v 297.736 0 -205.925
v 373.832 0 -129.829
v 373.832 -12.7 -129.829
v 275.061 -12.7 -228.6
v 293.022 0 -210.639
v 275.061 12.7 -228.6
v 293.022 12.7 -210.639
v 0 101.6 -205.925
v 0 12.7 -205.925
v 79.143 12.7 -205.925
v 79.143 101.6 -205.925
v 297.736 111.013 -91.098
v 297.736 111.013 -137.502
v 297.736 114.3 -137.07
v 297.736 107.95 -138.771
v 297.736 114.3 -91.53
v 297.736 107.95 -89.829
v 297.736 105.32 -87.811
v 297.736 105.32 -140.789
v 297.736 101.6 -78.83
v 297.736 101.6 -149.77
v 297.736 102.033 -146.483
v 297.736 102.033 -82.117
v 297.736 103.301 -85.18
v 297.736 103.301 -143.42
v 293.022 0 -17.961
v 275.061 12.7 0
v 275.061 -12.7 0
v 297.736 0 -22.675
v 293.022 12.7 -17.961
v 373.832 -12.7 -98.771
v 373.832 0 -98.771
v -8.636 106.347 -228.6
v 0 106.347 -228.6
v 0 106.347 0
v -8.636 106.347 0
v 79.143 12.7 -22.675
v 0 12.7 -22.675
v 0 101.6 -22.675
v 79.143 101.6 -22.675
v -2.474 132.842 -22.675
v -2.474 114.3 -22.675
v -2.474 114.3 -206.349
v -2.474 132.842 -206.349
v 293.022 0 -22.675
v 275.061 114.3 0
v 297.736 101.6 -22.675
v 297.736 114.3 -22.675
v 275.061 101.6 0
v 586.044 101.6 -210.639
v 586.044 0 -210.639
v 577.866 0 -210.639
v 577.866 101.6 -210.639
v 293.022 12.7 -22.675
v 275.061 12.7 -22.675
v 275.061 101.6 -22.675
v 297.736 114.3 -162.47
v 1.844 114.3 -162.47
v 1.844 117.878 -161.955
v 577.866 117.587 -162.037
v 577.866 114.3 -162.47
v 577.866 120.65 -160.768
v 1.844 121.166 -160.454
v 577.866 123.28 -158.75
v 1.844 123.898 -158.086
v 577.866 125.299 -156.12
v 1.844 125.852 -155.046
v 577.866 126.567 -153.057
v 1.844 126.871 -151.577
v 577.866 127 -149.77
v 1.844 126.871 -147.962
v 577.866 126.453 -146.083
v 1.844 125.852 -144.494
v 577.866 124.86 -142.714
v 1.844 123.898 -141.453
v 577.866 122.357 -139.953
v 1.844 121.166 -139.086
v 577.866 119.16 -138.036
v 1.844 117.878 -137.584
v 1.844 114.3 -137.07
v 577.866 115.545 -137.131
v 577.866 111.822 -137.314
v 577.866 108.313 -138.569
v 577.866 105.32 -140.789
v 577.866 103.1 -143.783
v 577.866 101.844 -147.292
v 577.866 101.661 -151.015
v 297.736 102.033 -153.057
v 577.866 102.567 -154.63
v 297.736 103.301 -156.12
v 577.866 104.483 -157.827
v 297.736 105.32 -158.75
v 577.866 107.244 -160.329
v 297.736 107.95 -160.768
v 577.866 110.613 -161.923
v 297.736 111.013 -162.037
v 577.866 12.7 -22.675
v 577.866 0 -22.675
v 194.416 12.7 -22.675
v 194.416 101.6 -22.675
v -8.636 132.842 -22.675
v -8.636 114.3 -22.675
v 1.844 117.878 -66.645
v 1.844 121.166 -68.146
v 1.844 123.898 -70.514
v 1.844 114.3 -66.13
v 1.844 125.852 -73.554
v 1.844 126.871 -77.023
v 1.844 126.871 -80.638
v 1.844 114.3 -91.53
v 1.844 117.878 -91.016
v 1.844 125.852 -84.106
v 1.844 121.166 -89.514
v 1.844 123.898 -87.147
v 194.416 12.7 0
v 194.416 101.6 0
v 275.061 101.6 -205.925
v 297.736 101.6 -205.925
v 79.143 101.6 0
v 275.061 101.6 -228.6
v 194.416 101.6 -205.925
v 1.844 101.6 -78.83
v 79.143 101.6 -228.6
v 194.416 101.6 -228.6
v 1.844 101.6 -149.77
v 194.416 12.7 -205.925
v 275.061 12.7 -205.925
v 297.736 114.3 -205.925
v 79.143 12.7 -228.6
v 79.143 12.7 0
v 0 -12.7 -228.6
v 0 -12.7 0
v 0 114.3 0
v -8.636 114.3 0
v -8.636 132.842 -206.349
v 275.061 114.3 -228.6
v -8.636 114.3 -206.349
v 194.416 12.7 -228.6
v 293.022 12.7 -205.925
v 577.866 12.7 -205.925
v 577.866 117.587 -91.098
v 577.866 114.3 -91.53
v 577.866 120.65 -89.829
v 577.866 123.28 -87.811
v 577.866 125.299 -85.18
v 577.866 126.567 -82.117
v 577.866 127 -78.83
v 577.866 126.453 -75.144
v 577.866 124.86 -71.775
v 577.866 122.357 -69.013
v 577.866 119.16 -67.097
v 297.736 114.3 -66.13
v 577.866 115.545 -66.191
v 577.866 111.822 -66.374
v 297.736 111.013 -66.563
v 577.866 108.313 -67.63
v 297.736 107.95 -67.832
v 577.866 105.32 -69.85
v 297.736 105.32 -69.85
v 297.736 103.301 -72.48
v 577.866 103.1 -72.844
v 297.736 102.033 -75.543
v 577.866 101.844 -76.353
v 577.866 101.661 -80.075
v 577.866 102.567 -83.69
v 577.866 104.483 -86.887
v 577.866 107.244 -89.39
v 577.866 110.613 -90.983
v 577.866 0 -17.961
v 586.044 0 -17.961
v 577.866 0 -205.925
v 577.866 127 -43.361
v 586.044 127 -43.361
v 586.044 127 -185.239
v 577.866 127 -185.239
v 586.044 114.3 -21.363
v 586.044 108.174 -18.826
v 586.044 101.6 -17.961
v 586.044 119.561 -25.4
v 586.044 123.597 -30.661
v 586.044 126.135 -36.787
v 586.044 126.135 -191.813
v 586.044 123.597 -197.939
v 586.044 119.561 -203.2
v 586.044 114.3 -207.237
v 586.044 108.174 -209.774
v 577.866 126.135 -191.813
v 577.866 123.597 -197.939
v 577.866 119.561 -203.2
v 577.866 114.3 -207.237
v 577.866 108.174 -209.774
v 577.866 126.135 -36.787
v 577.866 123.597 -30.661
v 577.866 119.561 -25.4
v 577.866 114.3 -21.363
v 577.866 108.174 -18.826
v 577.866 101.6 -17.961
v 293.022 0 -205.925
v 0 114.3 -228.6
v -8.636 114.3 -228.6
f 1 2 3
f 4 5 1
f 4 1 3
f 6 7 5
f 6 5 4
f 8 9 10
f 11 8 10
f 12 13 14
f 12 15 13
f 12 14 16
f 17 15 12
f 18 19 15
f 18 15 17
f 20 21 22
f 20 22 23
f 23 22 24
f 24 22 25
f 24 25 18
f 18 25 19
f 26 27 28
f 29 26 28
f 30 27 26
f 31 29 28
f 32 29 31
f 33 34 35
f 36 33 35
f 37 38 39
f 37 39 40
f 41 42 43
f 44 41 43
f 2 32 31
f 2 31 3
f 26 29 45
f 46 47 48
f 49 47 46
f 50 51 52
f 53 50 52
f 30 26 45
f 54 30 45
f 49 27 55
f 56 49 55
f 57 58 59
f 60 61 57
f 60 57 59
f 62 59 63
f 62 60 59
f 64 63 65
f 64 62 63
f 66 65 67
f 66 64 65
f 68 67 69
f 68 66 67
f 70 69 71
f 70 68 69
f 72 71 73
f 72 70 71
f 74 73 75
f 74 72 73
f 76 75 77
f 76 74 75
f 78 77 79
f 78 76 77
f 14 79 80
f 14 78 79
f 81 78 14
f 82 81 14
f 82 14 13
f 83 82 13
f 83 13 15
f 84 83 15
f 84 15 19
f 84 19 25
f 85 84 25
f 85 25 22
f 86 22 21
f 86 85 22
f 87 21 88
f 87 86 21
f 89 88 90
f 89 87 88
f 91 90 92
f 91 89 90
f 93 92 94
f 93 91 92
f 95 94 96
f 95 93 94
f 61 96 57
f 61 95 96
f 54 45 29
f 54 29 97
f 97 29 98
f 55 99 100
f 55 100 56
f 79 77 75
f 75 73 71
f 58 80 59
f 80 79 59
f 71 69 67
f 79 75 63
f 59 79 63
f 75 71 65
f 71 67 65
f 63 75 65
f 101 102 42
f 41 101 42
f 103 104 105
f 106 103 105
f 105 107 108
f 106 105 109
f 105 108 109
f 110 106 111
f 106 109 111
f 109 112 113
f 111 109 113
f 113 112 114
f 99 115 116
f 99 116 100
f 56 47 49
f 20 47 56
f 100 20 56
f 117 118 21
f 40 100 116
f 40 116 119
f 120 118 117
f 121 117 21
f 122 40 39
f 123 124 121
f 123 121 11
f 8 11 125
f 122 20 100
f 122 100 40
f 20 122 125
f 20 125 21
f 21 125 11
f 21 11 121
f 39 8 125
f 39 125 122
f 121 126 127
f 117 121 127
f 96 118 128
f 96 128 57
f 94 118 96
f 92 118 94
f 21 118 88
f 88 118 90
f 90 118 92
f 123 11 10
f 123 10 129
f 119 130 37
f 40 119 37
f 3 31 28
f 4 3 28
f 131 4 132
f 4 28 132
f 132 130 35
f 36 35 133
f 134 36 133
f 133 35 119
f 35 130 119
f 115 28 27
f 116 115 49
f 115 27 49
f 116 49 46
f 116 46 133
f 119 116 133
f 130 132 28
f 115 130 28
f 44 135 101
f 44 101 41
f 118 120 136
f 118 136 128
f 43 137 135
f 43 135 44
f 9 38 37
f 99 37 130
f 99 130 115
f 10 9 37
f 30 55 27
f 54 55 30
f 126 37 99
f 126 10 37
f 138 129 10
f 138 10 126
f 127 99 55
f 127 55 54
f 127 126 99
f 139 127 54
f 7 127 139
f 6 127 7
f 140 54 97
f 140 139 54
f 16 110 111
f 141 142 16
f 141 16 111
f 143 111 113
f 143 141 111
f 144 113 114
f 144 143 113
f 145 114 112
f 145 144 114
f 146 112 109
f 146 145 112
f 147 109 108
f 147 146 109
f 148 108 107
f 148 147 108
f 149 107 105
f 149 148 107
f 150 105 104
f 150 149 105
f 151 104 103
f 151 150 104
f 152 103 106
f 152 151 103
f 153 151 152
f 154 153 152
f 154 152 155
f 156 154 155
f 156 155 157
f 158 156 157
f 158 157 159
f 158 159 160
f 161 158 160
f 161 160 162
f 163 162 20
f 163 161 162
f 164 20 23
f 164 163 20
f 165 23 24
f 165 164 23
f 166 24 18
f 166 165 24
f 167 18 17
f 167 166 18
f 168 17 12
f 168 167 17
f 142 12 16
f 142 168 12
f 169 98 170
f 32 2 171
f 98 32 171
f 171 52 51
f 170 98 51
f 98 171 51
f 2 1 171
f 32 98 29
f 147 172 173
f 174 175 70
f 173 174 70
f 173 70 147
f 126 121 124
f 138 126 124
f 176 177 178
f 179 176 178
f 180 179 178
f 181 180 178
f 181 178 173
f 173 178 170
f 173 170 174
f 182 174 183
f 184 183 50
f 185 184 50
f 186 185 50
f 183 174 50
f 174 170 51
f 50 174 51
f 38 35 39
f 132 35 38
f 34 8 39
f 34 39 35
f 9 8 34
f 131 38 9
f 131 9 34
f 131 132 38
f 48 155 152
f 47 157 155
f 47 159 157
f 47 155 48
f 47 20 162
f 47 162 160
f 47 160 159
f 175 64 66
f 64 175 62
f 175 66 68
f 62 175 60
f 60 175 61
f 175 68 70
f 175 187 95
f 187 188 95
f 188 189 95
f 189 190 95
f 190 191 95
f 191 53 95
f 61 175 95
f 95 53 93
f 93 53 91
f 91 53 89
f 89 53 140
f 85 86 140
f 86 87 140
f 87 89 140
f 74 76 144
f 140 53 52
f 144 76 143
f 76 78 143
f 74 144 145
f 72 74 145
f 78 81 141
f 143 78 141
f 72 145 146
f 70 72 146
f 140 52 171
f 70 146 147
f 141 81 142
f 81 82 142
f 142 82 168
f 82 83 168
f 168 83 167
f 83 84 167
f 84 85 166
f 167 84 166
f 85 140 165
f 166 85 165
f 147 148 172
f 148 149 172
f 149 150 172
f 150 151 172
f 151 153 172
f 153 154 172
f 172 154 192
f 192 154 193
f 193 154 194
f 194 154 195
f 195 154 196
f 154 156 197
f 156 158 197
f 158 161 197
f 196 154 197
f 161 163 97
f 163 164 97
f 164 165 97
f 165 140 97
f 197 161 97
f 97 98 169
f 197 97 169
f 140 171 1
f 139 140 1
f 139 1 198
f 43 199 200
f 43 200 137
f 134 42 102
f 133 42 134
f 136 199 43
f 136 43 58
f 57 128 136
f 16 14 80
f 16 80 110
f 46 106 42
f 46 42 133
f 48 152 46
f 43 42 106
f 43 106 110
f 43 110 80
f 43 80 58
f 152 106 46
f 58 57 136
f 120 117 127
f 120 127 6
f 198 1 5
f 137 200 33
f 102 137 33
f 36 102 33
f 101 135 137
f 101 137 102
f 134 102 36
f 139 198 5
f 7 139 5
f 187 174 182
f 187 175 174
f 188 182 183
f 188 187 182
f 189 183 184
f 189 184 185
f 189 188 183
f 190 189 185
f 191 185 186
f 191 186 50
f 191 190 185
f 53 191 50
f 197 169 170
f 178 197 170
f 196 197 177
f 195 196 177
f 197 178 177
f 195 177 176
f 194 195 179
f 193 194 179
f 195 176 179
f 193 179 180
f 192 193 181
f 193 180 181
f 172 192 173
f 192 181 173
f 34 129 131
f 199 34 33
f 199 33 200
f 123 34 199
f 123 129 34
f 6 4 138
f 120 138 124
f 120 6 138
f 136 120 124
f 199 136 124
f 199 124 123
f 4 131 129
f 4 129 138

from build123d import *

# Parameters (mm, degrees)
BOSS_EXTRUDE1_DEPTH = 12.7
BOSS_EXTRUDE2_DEPTH = 127
FILLET1_R           = 25.4
FILLET2_R           = 25.4
SKETCH1_5_W         = 80.645440106
SKETCH1_5_H         = 22.674837422
SKETCH1_5_W_2       = 79.142645348
BOSS_EXTRUDE3_DEPTH = 101.6
BOSS_EXTRUDE4_DEPTH = 12.7
BOSS_EXTRUDE5_DEPTH = 12.7
SKETCH5_R           = 12.7
BOSS_EXTRUDE7_DEPTH = 584.2
SKETCH7_W           = 228.6
SKETCH7_H           = 7.952880345
BOSS_EXTRUDE8_DEPTH = 8.636
SKETCH8_W           = 6.162041428
SKETCH8_H           = 183.673914537
BOSS_EXTRUDE9_DEPTH = 18.542


with BuildPart() as part:
    # Sketch1 → Boss-Extrude1 (new body)
    with BuildSketch(Plane(origin=(0, 0, 0), x_dir=(1, 0, 0), z_dir=(0, 1, 0))):
        Polygon((79.142645348, 22.674837422), (79.142645348, 0), (194.415916135, 0), (194.415916135, 22.674837422), (275.061356241, 22.674837422), (275.061356241, 0), (293.021868483, 17.960512242), (293.021868483, 22.674837422), (577.865587161, 22.674837422), (577.865587161, 114.3), (577.865587161, 205.925162578), (293.021868483, 205.925162578), (293.021868483, 210.639487758), (275.061356241, 228.6), (275.061356241, 205.925162578), (194.415916135, 205.925162578), (194.415916135, 228.6), (79.142645348, 228.6), (79.142645348, 205.925162578), (0, 205.925162578), (0, 22.674837422), align=None)
    extrude(amount=BOSS_EXTRUDE1_DEPTH)

    # Sketch1<4> → Boss-Extrude2 (add)
    with BuildSketch(Plane(origin=(0, 0, 0), x_dir=(1, 0, 0), z_dir=(0, 1, 0))):
        Polygon((577.865587161, 22.674837422), (577.865587161, 17.960512242), (586.043736966, 17.960512242), (586.043736966, 22.674837422), (586.043736966, 114.3), (586.043736966, 205.925162578), (586.043736966, 210.639487758), (577.865587161, 210.639487758), (577.865587161, 205.925162578), (577.865587161, 114.3), align=None)
    extrude(amount=BOSS_EXTRUDE2_DEPTH)

    # Fillet1
    fillet1_edges = [part.edges().sort_by_distance(p)[0] for p in [
        (581.954662063, 127, -17.960512242),
    ]]
    fillet(fillet1_edges, radius=FILLET1_R)

    # Fillet2
    fillet2_edges = [part.edges().sort_by_distance(p)[0] for p in [
        (581.954662063, 127, -210.639487758),
    ]]
    fillet(fillet2_edges, radius=FILLET2_R)

    # Sketch1<5> → Boss-Extrude3 (add)
    with BuildSketch(Plane(origin=(0, 0, 0), x_dir=(1, 0, 0), z_dir=(0, 1, 0))):
        with Locations((234.738636188, 217.262581289)):
            Rectangle(SKETCH1_5_W, SKETCH1_5_H)
        with Locations((39.571322674, 217.262581289)):
            Rectangle(SKETCH1_5_W_2, SKETCH1_5_H)
        with Locations((234.738636188, 11.337418711)):
            Rectangle(SKETCH1_5_W, SKETCH1_5_H)
        with Locations((39.571322674, 11.337418711)):
            Rectangle(SKETCH1_5_W_2, SKETCH1_5_H)
    extrude(amount=BOSS_EXTRUDE3_DEPTH)

    # Sketch2 → Boss-Extrude4 (add)
    with BuildSketch(Plane.XZ):
        Polygon((275.061356241, 0), (373.832124936, -98.770768695), (373.832124936, -129.829231305), (275.061356241, -228.6), (0, -228.6), (0, 0), align=None)
    extrude(amount=BOSS_EXTRUDE4_DEPTH)

    # Sketch4 → Boss-Extrude5 (add)
    with BuildSketch(Plane(origin=(0, 101.6, 0), x_dir=(1, 0, 0), z_dir=(0, 1, 0))):
        Polygon((275.061356241, 228.6), (297.736193663, 205.925162578), (297.736193663, 22.674837422), (275.061356241, 0), (0, 0), (0, 228.6), align=None)
    extrude(amount=BOSS_EXTRUDE5_DEPTH)

    # Sketch5 → Boss-Extrude7 (add)
    with BuildSketch(Plane(origin=(586.043736966, 0, 0), x_dir=(0, 0, -1), z_dir=(1, 0, 0))):
        with Locations((78.830256121, 114.3)):
            Circle(SKETCH5_R)
        with Locations((149.769743879, 114.3)):
            Circle(SKETCH5_R)
    extrude(amount=-BOSS_EXTRUDE7_DEPTH)

    # Sketch7 → Boss-Extrude8 (add)
    with BuildSketch(Plane.ZY):
        with Locations((-114.3, 110.323559828)):
            Rectangle(SKETCH7_W, SKETCH7_H)
    extrude(amount=BOSS_EXTRUDE8_DEPTH)

    # Sketch8 → Boss-Extrude9 (add)
    with BuildSketch(Plane(origin=(0, 114.3, 0), x_dir=(1, 0, 0), z_dir=(0, 1, 0))):
        with Locations((-5.554979286, 114.511794691)):
            Rectangle(SKETCH8_W, SKETCH8_H)
    extrude(amount=BOSS_EXTRUDE9_DEPTH)


solid = part.part
